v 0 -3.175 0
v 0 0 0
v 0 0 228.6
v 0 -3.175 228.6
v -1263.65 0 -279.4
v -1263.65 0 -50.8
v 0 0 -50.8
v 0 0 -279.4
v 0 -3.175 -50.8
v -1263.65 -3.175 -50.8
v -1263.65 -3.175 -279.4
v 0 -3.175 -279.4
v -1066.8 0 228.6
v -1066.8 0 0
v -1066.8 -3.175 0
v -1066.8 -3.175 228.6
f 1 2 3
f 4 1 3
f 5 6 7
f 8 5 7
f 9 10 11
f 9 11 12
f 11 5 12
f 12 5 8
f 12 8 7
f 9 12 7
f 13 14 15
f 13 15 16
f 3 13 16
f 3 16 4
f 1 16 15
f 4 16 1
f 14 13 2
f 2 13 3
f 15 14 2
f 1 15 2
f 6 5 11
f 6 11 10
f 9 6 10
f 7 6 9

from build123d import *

# Parameters (mm, degrees)
F0_W     = 1066.8
F0_H     = 228.6
F0_W_2   = 1263.65
F1_DEPTH = 3.175


with BuildPart() as f1:
    # F0 (on Front) → F1 (new body)
    with BuildSketch(Plane.XZ):
        with Locations((-533.4, 114.3)):
            Rectangle(F0_W, F0_H)
        with Locations((-631.825, -165.1)):
            Rectangle(F0_W_2, F0_H)
    extrude(amount=F1_DEPTH)


solid = f1.part
